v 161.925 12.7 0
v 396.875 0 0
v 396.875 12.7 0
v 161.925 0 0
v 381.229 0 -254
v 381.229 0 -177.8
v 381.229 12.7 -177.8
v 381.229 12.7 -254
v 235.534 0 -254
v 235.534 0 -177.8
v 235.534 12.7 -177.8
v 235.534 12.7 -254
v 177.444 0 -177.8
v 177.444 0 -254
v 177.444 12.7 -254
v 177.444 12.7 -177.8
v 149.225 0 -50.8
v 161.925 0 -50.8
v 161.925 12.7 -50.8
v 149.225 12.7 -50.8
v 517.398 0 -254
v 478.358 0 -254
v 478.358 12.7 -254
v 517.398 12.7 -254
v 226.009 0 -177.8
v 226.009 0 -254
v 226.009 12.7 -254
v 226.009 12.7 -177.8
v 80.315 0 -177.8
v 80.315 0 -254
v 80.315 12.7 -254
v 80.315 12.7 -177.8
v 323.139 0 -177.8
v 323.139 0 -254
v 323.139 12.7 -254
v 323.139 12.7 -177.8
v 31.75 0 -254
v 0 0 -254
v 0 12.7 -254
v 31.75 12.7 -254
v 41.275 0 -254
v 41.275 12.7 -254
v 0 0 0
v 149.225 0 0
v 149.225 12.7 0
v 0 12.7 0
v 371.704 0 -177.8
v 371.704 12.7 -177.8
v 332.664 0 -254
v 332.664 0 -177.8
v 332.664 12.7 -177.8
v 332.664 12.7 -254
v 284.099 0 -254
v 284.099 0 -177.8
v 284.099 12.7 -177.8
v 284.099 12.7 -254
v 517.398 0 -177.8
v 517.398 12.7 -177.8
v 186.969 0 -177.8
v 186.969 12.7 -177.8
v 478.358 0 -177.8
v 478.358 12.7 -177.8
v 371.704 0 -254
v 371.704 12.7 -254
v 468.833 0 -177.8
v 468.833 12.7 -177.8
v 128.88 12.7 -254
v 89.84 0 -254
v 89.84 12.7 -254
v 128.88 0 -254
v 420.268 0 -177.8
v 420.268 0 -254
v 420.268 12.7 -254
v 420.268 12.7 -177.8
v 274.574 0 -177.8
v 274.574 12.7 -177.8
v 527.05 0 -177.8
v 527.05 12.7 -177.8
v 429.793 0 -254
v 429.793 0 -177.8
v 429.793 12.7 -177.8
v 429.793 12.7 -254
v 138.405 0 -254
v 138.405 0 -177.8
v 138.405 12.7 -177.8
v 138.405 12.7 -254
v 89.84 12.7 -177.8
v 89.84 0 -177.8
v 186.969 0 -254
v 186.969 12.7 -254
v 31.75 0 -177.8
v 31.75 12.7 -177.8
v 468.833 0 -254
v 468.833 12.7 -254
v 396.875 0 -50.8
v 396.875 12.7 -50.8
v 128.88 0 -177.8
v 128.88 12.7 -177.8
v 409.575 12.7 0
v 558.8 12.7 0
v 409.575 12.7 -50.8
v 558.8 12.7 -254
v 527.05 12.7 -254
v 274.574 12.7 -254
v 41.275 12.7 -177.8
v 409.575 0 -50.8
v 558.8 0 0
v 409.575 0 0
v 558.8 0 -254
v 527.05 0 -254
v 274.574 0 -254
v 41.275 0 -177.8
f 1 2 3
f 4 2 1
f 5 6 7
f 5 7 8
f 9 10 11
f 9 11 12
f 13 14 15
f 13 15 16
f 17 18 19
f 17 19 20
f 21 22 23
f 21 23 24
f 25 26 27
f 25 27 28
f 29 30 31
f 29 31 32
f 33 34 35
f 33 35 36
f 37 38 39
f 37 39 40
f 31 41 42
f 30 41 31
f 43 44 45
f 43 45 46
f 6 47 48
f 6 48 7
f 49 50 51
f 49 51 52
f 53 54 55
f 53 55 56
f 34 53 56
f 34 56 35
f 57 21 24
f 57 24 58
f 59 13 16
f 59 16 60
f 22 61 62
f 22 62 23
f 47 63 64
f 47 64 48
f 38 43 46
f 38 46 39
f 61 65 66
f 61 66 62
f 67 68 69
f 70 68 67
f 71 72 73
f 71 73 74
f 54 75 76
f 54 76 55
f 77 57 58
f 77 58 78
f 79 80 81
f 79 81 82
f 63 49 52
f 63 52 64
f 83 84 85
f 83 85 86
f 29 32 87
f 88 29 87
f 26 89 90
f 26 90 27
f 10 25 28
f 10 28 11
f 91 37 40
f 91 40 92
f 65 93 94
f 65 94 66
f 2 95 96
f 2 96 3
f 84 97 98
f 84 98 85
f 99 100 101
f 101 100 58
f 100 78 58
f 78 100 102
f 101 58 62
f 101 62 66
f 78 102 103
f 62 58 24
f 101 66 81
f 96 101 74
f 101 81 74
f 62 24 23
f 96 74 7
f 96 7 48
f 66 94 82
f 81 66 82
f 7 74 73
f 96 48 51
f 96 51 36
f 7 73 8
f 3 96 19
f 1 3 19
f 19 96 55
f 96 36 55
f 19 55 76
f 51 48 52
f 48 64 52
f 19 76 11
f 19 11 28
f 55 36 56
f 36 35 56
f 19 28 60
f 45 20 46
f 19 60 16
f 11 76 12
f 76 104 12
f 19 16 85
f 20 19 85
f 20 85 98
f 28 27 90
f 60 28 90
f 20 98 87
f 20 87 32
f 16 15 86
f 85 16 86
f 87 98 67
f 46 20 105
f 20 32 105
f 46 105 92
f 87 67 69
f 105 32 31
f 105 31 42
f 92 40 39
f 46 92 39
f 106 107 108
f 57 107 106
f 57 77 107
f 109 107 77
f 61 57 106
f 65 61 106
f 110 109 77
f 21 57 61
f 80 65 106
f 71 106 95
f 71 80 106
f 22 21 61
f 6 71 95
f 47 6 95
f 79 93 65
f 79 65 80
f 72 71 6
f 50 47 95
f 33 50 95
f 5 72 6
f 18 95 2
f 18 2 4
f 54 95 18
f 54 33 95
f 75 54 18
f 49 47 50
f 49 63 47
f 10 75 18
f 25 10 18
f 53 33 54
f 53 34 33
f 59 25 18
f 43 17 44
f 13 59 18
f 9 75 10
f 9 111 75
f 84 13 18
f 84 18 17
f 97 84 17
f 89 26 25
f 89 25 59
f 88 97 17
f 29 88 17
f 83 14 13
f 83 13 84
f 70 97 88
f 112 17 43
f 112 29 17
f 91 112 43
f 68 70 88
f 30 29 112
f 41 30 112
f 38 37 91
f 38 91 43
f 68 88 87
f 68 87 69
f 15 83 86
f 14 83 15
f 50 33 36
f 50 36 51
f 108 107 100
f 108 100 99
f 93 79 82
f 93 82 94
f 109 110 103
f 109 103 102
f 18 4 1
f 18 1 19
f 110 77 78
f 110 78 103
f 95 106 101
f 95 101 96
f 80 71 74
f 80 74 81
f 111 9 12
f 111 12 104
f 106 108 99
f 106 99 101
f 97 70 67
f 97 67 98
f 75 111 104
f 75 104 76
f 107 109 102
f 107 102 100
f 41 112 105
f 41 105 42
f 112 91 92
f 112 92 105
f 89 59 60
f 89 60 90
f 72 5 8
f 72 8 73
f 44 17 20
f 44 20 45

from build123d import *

# Parameters (mm, degrees)
BOSS_EXTRUDE1_DEPTH = 12.7


with BuildPart() as part:
    # Sketch1 → Boss-Extrude1 (new body)
    with BuildSketch(Plane(origin=(0, 0, 0), x_dir=(1, 0, 0), z_dir=(0, 1, 0))):
        Polygon((0, 0), (0, 254), (31.75, 254), (31.75, 177.8), (41.275, 177.8), (41.275, 254), (80.3148, 254), (80.3148, 177.8), (89.8398, 177.8), (89.8398, 254), (128.8796, 254), (128.8796, 177.8), (138.4046, 177.8), (138.4046, 254), (177.4444, 254), (177.4444, 177.8), (186.9694, 177.8), (186.9694, 254), (226.0092, 254), (226.0092, 177.8), (235.5342, 177.8), (235.5342, 254), (274.574, 254), (274.574, 177.8), (284.099, 177.8), (284.099, 254), (323.1388, 254), (323.1388, 177.8), (332.6638, 177.8), (332.6638, 254), (371.7036, 254), (371.7036, 177.8), (381.2286, 177.8), (381.2286, 254), (420.2684, 254), (420.2684, 177.8), (429.7934, 177.8), (429.7934, 254), (468.8332, 254), (468.8332, 177.8), (478.3582, 177.8), (478.3582, 254), (517.398, 254), (517.398, 177.8), (527.05, 177.8), (527.05, 254), (558.8, 254), (558.8, 0), (409.575, 0), (409.575, 50.8), (396.875, 50.8), (396.875, 0), (161.925, 0), (161.925, 50.8), (149.225, 50.8), (149.225, 0), align=None)
    extrude(amount=BOSS_EXTRUDE1_DEPTH)


solid = part.part
